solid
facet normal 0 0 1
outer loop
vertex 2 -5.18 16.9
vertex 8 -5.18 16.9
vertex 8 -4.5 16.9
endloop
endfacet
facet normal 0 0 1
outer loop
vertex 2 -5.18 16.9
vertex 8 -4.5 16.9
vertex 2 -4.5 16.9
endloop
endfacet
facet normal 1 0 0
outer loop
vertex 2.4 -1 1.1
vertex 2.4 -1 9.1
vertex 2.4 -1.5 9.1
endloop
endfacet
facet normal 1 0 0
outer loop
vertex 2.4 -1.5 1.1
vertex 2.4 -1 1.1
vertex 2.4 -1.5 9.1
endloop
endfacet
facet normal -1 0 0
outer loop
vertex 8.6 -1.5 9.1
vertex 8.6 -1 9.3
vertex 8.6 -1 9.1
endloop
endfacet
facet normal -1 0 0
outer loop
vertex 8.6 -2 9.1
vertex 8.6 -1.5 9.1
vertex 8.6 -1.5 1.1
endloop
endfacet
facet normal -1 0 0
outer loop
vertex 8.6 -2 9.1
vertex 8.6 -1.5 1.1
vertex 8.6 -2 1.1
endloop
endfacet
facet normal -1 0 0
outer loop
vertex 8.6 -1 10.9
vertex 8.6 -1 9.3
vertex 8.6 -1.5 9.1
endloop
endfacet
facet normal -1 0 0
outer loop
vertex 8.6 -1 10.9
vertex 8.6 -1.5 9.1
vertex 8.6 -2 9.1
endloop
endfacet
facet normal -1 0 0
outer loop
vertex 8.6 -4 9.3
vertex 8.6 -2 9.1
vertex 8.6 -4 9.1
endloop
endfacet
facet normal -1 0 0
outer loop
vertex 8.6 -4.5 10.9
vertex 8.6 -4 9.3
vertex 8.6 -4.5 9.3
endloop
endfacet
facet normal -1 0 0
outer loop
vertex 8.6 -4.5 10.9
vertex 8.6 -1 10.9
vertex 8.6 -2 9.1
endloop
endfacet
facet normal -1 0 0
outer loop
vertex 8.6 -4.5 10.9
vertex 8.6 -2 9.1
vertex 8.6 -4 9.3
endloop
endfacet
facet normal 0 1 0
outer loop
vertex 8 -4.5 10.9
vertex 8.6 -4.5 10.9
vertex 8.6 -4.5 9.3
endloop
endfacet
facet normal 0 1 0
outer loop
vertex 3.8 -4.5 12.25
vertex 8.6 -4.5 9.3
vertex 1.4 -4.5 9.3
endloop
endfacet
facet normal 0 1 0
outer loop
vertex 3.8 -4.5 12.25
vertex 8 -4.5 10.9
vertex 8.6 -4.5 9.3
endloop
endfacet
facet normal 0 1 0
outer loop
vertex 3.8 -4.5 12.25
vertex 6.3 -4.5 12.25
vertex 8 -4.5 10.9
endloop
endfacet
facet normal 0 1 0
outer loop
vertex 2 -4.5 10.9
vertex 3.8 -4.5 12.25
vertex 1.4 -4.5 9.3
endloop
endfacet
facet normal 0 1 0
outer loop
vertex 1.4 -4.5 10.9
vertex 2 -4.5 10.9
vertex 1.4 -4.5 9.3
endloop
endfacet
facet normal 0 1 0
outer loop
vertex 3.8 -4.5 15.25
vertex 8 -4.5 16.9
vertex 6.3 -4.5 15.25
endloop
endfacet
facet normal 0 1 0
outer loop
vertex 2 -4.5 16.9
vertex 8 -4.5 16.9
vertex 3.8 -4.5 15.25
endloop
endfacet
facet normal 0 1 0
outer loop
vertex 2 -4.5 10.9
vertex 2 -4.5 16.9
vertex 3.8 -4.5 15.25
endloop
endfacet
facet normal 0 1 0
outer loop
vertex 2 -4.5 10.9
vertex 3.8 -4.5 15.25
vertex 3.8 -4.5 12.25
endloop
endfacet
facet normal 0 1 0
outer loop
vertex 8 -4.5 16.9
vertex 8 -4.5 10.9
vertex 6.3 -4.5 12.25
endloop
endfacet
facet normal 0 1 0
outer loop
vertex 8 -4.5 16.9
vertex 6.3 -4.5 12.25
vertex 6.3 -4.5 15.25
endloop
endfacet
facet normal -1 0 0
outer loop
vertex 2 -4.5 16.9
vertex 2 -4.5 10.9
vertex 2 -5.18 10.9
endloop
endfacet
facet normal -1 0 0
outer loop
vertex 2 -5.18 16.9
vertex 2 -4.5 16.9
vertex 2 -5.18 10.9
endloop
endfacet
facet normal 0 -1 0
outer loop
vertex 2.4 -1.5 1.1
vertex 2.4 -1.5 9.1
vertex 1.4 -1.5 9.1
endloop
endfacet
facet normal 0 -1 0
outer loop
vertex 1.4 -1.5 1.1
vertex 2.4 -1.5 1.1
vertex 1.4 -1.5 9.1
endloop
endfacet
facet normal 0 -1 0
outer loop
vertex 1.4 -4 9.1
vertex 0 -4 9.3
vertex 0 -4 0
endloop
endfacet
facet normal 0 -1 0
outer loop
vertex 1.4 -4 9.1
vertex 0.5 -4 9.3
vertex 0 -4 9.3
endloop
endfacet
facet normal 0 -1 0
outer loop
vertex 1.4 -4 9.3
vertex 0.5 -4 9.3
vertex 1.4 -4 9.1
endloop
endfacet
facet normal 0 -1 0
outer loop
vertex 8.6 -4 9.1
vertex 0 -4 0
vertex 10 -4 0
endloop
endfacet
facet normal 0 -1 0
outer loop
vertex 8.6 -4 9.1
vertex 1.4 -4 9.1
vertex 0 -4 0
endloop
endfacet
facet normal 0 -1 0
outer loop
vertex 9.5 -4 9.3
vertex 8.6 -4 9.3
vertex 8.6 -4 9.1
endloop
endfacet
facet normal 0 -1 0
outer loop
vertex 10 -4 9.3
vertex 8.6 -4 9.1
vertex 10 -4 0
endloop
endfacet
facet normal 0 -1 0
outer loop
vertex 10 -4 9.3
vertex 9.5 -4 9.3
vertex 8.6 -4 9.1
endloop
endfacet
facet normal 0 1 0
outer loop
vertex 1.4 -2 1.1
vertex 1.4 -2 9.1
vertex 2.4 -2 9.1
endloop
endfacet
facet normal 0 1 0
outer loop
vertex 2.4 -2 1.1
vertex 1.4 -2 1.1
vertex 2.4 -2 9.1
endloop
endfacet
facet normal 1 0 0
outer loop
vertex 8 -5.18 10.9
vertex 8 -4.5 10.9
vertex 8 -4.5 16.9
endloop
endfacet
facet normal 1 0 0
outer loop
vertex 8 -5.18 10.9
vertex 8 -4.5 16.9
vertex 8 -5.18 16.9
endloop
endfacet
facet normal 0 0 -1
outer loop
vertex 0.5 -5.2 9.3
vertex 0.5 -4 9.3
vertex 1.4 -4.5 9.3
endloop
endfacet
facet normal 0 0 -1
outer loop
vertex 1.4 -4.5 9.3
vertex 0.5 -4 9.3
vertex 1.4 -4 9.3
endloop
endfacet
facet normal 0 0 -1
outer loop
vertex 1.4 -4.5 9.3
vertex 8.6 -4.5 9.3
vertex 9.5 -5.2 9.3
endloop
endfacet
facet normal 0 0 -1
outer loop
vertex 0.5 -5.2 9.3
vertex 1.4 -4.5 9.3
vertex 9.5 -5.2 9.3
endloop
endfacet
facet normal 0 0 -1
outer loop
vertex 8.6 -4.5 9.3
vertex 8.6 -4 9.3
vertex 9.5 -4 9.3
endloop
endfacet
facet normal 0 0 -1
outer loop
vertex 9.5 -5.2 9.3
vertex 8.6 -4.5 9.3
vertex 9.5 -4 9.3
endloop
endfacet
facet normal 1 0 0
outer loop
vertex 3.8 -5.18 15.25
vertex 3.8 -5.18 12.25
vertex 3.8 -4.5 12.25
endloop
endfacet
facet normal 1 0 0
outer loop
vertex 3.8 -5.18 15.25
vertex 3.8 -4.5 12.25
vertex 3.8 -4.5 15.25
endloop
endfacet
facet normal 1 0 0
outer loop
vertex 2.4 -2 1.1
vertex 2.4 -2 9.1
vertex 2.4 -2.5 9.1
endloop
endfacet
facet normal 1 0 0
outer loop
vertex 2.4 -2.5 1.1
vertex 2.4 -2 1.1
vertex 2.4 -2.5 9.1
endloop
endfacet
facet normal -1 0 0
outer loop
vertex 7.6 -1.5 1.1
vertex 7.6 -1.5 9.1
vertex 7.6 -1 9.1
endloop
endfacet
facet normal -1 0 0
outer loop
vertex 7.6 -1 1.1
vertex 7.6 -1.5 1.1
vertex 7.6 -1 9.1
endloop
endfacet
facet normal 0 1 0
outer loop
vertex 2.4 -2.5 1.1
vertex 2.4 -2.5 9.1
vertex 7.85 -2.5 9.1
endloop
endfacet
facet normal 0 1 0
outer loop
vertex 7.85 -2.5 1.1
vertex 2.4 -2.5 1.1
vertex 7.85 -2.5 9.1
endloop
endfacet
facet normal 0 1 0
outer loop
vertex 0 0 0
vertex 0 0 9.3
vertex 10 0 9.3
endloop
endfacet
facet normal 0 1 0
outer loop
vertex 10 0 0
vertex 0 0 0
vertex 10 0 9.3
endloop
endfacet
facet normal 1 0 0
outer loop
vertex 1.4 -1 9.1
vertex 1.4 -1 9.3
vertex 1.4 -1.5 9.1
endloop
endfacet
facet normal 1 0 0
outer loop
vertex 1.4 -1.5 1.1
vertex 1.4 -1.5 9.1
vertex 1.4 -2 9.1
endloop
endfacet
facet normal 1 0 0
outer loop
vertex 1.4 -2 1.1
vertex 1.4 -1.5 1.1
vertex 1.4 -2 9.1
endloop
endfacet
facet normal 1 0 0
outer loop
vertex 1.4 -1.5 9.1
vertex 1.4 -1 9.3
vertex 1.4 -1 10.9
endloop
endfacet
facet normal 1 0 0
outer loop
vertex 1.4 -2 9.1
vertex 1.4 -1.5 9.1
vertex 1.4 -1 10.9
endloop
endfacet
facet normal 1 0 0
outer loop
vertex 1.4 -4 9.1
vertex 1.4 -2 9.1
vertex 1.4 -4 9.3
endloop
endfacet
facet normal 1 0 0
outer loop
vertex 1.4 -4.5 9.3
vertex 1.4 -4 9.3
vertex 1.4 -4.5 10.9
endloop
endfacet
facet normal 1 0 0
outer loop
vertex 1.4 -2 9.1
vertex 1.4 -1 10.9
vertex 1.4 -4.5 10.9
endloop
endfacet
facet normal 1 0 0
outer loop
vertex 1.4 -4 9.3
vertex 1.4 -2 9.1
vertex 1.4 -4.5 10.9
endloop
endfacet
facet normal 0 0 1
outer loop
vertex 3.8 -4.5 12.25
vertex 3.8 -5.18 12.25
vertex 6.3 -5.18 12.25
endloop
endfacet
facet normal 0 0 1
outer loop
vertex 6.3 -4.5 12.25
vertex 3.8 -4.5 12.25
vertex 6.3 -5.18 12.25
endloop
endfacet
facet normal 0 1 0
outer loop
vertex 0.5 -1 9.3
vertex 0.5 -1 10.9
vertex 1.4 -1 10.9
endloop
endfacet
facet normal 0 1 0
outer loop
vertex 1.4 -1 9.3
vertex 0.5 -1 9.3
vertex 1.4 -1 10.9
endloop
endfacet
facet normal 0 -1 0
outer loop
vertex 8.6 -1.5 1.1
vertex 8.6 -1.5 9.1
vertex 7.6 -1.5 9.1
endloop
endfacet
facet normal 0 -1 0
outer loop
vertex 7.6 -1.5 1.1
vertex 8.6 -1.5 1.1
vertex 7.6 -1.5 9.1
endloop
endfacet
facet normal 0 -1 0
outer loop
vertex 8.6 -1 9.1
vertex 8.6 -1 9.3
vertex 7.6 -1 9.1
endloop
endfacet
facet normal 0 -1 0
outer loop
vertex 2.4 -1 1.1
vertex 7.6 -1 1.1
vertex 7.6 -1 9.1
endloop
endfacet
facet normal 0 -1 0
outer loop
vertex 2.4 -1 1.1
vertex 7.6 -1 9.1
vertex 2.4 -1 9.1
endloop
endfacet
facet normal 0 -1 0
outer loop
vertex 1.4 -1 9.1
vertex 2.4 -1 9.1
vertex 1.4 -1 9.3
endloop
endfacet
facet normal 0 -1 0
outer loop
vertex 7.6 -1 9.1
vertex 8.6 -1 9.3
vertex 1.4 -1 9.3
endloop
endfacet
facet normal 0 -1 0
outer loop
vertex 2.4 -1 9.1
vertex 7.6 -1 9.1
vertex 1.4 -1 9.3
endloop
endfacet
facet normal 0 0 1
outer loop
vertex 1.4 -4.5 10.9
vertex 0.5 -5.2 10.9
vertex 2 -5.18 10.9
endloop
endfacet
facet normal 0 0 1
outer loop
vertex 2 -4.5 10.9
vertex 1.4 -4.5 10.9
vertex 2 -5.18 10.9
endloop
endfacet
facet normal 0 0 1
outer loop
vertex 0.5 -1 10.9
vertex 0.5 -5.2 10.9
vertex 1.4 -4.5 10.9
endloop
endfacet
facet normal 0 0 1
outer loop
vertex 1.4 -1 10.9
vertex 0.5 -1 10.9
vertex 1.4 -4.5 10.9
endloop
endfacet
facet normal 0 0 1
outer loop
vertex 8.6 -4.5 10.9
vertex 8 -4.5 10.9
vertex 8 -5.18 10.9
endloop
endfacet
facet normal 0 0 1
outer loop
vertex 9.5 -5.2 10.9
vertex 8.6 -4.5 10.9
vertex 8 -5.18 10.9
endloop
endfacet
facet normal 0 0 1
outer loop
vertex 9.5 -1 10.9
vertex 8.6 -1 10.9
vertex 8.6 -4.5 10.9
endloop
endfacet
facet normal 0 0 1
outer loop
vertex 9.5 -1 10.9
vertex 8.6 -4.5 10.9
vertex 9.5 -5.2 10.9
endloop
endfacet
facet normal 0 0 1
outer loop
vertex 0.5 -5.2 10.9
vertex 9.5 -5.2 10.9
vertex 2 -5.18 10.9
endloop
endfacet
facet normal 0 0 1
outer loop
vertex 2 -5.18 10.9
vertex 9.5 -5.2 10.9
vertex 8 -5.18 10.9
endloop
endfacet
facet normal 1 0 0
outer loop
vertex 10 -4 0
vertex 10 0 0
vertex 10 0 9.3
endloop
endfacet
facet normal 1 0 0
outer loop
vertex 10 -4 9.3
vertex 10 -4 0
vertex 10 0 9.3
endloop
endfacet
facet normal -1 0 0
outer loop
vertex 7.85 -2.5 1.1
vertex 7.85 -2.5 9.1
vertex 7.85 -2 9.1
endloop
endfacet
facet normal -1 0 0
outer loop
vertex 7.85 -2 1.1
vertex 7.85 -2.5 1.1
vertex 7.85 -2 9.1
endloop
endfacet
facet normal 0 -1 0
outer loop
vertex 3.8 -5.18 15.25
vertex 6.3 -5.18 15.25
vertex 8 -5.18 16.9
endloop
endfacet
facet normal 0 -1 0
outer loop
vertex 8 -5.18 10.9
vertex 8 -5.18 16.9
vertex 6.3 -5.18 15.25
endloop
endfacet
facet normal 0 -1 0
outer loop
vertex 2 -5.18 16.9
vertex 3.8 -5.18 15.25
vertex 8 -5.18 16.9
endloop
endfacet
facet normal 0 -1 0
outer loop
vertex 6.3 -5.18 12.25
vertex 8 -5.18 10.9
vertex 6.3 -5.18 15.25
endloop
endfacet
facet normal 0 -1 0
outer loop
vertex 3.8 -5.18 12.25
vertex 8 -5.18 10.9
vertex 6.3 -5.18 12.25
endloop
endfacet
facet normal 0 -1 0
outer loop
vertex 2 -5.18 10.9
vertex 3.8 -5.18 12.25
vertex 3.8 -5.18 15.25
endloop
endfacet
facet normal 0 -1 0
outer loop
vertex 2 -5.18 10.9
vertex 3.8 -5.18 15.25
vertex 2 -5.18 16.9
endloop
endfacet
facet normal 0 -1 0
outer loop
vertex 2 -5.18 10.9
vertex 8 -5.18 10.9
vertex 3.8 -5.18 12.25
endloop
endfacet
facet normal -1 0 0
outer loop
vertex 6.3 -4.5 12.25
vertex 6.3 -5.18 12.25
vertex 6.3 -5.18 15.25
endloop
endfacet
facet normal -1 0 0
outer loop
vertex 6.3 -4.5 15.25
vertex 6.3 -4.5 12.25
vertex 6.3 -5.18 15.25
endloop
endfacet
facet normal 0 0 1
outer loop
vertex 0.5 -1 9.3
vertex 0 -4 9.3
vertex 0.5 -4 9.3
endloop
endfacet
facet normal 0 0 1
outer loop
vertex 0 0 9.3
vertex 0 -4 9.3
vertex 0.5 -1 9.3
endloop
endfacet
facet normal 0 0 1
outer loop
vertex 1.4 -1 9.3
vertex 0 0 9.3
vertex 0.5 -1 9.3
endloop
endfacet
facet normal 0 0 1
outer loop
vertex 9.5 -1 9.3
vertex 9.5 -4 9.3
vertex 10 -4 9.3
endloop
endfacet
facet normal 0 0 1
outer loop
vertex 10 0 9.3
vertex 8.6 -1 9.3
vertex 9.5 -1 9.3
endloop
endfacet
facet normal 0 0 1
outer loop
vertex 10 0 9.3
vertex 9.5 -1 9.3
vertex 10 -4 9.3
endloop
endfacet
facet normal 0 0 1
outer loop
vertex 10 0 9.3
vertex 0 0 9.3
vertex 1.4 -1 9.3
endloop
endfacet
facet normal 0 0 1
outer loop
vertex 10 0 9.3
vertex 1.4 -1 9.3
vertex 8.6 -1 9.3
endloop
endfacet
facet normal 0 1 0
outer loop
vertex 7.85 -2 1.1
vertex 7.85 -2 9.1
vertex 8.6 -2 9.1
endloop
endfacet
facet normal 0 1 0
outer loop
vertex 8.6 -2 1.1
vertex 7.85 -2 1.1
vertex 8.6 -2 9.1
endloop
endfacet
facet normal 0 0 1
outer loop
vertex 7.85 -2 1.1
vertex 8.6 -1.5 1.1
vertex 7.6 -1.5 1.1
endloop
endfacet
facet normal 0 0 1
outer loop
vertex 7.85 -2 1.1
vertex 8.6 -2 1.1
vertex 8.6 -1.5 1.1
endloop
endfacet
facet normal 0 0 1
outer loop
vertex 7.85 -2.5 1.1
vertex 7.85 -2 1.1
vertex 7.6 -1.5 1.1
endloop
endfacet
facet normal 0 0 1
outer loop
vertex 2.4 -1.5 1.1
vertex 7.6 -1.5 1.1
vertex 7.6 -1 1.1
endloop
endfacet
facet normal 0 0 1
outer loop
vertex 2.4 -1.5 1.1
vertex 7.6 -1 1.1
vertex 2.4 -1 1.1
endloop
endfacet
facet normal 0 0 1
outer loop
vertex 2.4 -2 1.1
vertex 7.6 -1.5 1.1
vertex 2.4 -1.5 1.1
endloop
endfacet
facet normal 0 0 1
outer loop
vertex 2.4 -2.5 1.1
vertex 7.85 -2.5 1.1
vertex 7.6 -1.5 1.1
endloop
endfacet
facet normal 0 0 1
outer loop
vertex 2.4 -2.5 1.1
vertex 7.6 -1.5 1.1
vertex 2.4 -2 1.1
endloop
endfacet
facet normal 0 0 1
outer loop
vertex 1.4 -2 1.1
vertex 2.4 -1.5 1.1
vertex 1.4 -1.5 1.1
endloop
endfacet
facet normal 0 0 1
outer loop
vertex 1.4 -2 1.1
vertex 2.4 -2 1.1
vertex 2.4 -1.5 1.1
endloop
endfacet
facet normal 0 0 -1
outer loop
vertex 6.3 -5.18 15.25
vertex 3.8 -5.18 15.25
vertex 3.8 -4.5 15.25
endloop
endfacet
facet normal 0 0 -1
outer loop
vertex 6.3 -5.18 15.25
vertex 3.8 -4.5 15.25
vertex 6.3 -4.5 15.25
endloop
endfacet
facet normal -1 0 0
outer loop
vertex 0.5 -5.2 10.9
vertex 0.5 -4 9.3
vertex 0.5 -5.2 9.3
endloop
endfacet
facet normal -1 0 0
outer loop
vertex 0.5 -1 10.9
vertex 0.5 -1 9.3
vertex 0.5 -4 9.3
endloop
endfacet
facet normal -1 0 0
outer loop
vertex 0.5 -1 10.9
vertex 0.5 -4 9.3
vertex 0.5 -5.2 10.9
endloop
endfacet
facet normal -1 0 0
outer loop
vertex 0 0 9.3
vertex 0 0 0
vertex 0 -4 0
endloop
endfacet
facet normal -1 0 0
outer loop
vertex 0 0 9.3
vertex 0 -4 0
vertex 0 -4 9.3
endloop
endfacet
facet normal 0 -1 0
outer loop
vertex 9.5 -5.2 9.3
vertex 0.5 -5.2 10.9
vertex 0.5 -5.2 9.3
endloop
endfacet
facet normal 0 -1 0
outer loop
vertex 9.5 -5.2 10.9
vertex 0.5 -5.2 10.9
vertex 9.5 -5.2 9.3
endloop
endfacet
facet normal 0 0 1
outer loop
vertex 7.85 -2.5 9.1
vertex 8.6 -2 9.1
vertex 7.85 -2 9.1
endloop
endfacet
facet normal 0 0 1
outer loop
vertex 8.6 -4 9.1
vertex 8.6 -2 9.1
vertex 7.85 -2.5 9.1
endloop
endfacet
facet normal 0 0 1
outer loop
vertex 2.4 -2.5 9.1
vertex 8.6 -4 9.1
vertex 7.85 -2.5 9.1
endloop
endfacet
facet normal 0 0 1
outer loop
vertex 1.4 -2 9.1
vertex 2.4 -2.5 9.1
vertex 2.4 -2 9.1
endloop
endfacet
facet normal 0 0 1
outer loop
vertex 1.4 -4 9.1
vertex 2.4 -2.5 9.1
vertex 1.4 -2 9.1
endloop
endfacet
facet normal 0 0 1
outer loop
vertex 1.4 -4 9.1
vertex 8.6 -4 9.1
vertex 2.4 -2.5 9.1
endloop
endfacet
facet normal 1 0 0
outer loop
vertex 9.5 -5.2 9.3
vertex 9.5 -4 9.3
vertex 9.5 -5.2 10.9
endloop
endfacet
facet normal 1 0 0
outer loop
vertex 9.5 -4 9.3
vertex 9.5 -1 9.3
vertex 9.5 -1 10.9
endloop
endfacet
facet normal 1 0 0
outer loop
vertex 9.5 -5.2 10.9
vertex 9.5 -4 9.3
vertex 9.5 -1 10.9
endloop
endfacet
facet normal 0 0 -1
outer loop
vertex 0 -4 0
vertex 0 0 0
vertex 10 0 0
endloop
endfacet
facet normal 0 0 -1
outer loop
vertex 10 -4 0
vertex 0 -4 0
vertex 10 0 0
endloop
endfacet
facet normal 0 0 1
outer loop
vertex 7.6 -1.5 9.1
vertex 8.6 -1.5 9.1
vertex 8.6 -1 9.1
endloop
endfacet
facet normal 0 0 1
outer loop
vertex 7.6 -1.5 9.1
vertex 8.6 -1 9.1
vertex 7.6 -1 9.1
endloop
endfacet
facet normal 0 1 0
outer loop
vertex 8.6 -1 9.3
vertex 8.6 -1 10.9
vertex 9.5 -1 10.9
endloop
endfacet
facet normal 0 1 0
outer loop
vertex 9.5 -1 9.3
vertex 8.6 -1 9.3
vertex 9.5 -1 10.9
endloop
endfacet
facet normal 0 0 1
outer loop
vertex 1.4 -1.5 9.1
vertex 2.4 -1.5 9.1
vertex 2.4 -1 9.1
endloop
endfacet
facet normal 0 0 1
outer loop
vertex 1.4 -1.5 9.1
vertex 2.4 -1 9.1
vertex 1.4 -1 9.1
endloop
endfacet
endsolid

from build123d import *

# Parameters (mm, degrees)
SKETCH_W        = 10
SKETCH_H        = 9.3
PAD_DEPTH       = 4
SKETCH001_W     = 9
SKETCH001_H     = 1.6
PAD001_DEPTH    = 3
SKETCH002_W     = 9
SKETCH002_H     = 1.6
PAD002_DEPTH    = 1.2
SKETCH003_W     = 7.2
SKETCH003_H     = 3.5
POCKET_DEPTH    = 1.8
POCKET001_DEPTH = 8
SKETCH005_W     = 6
SKETCH005_H     = 0.68
PAD003_DEPTH    = 6
SKETCH006_W     = 2.5
SKETCH006_H     = 3
POCKET002_DEPTH = 5


with BuildPart() as part:
    # Sketch → Pad (new body)
    with BuildSketch(Plane.XZ):
        with Locations((5, 4.65)):
            Rectangle(SKETCH_W, SKETCH_H)
    extrude(amount=PAD_DEPTH)

    # Sketch001 (on Face6 of Pad) → Pad001 (join)
    with BuildSketch(Plane.XZ.offset(4)):
        with Locations((5, 10.1)):
            Rectangle(SKETCH001_W, SKETCH001_H)
    extrude(amount=-PAD001_DEPTH)

    # Sketch002 (on Face10 of Pad001) → Pad002 (join)
    with BuildSketch(Plane.XZ.offset(4)):
        with Locations((5, 10.1)):
            Rectangle(SKETCH002_W, SKETCH002_H)
    extrude(amount=PAD002_DEPTH)

    # Sketch003 (on Face12 of Pad002) → Pocket (cut)
    with BuildSketch(Plane(origin=(0, 0, 10.9), x_dir=(-1, 0, 0), z_dir=(0, 0, 1))):
        with Locations((-5, 2.75)):
            Rectangle(SKETCH003_W, SKETCH003_H)
    extrude(amount=-POCKET_DEPTH, mode=Mode.SUBTRACT)

    # Sketch004 (on Face9 of Pocket) → Pocket001 (cut)
    with BuildSketch(Plane(origin=(0, 0, 9.1), x_dir=(-1, 0, 0), z_dir=(0, 0, 1))):
        Polygon((-8.6, 1.5), (-7.6, 1.5), (-7.6, 1), (-2.4, 1), (-2.4, 1.5), (-1.4, 1.5), (-1.4, 2), (-2.4, 2), (-2.4, 2.5), (-7.85, 2.5), (-7.85, 2), (-8.6, 2), align=None)
    extrude(amount=-POCKET001_DEPTH, mode=Mode.SUBTRACT)

    # Sketch005 (on Face21 of Pocket001) → Pad003 (join)
    with BuildSketch(Plane(origin=(0, 0, 10.9), x_dir=(-1, 0, 0), z_dir=(0, 0, 1))):
        with Locations((-5, 4.84)):
            Rectangle(SKETCH005_W, SKETCH005_H)
    extrude(amount=PAD003_DEPTH)

    # Sketch006 (on Face30 of Pad003) → Pocket002 (cut)
    with BuildSketch(Plane.XZ.offset(5.18)):
        with Locations((5.05, 13.75)):
            Rectangle(SKETCH006_W, SKETCH006_H)
    extrude(amount=-POCKET002_DEPTH, mode=Mode.SUBTRACT)


solid = part.part
